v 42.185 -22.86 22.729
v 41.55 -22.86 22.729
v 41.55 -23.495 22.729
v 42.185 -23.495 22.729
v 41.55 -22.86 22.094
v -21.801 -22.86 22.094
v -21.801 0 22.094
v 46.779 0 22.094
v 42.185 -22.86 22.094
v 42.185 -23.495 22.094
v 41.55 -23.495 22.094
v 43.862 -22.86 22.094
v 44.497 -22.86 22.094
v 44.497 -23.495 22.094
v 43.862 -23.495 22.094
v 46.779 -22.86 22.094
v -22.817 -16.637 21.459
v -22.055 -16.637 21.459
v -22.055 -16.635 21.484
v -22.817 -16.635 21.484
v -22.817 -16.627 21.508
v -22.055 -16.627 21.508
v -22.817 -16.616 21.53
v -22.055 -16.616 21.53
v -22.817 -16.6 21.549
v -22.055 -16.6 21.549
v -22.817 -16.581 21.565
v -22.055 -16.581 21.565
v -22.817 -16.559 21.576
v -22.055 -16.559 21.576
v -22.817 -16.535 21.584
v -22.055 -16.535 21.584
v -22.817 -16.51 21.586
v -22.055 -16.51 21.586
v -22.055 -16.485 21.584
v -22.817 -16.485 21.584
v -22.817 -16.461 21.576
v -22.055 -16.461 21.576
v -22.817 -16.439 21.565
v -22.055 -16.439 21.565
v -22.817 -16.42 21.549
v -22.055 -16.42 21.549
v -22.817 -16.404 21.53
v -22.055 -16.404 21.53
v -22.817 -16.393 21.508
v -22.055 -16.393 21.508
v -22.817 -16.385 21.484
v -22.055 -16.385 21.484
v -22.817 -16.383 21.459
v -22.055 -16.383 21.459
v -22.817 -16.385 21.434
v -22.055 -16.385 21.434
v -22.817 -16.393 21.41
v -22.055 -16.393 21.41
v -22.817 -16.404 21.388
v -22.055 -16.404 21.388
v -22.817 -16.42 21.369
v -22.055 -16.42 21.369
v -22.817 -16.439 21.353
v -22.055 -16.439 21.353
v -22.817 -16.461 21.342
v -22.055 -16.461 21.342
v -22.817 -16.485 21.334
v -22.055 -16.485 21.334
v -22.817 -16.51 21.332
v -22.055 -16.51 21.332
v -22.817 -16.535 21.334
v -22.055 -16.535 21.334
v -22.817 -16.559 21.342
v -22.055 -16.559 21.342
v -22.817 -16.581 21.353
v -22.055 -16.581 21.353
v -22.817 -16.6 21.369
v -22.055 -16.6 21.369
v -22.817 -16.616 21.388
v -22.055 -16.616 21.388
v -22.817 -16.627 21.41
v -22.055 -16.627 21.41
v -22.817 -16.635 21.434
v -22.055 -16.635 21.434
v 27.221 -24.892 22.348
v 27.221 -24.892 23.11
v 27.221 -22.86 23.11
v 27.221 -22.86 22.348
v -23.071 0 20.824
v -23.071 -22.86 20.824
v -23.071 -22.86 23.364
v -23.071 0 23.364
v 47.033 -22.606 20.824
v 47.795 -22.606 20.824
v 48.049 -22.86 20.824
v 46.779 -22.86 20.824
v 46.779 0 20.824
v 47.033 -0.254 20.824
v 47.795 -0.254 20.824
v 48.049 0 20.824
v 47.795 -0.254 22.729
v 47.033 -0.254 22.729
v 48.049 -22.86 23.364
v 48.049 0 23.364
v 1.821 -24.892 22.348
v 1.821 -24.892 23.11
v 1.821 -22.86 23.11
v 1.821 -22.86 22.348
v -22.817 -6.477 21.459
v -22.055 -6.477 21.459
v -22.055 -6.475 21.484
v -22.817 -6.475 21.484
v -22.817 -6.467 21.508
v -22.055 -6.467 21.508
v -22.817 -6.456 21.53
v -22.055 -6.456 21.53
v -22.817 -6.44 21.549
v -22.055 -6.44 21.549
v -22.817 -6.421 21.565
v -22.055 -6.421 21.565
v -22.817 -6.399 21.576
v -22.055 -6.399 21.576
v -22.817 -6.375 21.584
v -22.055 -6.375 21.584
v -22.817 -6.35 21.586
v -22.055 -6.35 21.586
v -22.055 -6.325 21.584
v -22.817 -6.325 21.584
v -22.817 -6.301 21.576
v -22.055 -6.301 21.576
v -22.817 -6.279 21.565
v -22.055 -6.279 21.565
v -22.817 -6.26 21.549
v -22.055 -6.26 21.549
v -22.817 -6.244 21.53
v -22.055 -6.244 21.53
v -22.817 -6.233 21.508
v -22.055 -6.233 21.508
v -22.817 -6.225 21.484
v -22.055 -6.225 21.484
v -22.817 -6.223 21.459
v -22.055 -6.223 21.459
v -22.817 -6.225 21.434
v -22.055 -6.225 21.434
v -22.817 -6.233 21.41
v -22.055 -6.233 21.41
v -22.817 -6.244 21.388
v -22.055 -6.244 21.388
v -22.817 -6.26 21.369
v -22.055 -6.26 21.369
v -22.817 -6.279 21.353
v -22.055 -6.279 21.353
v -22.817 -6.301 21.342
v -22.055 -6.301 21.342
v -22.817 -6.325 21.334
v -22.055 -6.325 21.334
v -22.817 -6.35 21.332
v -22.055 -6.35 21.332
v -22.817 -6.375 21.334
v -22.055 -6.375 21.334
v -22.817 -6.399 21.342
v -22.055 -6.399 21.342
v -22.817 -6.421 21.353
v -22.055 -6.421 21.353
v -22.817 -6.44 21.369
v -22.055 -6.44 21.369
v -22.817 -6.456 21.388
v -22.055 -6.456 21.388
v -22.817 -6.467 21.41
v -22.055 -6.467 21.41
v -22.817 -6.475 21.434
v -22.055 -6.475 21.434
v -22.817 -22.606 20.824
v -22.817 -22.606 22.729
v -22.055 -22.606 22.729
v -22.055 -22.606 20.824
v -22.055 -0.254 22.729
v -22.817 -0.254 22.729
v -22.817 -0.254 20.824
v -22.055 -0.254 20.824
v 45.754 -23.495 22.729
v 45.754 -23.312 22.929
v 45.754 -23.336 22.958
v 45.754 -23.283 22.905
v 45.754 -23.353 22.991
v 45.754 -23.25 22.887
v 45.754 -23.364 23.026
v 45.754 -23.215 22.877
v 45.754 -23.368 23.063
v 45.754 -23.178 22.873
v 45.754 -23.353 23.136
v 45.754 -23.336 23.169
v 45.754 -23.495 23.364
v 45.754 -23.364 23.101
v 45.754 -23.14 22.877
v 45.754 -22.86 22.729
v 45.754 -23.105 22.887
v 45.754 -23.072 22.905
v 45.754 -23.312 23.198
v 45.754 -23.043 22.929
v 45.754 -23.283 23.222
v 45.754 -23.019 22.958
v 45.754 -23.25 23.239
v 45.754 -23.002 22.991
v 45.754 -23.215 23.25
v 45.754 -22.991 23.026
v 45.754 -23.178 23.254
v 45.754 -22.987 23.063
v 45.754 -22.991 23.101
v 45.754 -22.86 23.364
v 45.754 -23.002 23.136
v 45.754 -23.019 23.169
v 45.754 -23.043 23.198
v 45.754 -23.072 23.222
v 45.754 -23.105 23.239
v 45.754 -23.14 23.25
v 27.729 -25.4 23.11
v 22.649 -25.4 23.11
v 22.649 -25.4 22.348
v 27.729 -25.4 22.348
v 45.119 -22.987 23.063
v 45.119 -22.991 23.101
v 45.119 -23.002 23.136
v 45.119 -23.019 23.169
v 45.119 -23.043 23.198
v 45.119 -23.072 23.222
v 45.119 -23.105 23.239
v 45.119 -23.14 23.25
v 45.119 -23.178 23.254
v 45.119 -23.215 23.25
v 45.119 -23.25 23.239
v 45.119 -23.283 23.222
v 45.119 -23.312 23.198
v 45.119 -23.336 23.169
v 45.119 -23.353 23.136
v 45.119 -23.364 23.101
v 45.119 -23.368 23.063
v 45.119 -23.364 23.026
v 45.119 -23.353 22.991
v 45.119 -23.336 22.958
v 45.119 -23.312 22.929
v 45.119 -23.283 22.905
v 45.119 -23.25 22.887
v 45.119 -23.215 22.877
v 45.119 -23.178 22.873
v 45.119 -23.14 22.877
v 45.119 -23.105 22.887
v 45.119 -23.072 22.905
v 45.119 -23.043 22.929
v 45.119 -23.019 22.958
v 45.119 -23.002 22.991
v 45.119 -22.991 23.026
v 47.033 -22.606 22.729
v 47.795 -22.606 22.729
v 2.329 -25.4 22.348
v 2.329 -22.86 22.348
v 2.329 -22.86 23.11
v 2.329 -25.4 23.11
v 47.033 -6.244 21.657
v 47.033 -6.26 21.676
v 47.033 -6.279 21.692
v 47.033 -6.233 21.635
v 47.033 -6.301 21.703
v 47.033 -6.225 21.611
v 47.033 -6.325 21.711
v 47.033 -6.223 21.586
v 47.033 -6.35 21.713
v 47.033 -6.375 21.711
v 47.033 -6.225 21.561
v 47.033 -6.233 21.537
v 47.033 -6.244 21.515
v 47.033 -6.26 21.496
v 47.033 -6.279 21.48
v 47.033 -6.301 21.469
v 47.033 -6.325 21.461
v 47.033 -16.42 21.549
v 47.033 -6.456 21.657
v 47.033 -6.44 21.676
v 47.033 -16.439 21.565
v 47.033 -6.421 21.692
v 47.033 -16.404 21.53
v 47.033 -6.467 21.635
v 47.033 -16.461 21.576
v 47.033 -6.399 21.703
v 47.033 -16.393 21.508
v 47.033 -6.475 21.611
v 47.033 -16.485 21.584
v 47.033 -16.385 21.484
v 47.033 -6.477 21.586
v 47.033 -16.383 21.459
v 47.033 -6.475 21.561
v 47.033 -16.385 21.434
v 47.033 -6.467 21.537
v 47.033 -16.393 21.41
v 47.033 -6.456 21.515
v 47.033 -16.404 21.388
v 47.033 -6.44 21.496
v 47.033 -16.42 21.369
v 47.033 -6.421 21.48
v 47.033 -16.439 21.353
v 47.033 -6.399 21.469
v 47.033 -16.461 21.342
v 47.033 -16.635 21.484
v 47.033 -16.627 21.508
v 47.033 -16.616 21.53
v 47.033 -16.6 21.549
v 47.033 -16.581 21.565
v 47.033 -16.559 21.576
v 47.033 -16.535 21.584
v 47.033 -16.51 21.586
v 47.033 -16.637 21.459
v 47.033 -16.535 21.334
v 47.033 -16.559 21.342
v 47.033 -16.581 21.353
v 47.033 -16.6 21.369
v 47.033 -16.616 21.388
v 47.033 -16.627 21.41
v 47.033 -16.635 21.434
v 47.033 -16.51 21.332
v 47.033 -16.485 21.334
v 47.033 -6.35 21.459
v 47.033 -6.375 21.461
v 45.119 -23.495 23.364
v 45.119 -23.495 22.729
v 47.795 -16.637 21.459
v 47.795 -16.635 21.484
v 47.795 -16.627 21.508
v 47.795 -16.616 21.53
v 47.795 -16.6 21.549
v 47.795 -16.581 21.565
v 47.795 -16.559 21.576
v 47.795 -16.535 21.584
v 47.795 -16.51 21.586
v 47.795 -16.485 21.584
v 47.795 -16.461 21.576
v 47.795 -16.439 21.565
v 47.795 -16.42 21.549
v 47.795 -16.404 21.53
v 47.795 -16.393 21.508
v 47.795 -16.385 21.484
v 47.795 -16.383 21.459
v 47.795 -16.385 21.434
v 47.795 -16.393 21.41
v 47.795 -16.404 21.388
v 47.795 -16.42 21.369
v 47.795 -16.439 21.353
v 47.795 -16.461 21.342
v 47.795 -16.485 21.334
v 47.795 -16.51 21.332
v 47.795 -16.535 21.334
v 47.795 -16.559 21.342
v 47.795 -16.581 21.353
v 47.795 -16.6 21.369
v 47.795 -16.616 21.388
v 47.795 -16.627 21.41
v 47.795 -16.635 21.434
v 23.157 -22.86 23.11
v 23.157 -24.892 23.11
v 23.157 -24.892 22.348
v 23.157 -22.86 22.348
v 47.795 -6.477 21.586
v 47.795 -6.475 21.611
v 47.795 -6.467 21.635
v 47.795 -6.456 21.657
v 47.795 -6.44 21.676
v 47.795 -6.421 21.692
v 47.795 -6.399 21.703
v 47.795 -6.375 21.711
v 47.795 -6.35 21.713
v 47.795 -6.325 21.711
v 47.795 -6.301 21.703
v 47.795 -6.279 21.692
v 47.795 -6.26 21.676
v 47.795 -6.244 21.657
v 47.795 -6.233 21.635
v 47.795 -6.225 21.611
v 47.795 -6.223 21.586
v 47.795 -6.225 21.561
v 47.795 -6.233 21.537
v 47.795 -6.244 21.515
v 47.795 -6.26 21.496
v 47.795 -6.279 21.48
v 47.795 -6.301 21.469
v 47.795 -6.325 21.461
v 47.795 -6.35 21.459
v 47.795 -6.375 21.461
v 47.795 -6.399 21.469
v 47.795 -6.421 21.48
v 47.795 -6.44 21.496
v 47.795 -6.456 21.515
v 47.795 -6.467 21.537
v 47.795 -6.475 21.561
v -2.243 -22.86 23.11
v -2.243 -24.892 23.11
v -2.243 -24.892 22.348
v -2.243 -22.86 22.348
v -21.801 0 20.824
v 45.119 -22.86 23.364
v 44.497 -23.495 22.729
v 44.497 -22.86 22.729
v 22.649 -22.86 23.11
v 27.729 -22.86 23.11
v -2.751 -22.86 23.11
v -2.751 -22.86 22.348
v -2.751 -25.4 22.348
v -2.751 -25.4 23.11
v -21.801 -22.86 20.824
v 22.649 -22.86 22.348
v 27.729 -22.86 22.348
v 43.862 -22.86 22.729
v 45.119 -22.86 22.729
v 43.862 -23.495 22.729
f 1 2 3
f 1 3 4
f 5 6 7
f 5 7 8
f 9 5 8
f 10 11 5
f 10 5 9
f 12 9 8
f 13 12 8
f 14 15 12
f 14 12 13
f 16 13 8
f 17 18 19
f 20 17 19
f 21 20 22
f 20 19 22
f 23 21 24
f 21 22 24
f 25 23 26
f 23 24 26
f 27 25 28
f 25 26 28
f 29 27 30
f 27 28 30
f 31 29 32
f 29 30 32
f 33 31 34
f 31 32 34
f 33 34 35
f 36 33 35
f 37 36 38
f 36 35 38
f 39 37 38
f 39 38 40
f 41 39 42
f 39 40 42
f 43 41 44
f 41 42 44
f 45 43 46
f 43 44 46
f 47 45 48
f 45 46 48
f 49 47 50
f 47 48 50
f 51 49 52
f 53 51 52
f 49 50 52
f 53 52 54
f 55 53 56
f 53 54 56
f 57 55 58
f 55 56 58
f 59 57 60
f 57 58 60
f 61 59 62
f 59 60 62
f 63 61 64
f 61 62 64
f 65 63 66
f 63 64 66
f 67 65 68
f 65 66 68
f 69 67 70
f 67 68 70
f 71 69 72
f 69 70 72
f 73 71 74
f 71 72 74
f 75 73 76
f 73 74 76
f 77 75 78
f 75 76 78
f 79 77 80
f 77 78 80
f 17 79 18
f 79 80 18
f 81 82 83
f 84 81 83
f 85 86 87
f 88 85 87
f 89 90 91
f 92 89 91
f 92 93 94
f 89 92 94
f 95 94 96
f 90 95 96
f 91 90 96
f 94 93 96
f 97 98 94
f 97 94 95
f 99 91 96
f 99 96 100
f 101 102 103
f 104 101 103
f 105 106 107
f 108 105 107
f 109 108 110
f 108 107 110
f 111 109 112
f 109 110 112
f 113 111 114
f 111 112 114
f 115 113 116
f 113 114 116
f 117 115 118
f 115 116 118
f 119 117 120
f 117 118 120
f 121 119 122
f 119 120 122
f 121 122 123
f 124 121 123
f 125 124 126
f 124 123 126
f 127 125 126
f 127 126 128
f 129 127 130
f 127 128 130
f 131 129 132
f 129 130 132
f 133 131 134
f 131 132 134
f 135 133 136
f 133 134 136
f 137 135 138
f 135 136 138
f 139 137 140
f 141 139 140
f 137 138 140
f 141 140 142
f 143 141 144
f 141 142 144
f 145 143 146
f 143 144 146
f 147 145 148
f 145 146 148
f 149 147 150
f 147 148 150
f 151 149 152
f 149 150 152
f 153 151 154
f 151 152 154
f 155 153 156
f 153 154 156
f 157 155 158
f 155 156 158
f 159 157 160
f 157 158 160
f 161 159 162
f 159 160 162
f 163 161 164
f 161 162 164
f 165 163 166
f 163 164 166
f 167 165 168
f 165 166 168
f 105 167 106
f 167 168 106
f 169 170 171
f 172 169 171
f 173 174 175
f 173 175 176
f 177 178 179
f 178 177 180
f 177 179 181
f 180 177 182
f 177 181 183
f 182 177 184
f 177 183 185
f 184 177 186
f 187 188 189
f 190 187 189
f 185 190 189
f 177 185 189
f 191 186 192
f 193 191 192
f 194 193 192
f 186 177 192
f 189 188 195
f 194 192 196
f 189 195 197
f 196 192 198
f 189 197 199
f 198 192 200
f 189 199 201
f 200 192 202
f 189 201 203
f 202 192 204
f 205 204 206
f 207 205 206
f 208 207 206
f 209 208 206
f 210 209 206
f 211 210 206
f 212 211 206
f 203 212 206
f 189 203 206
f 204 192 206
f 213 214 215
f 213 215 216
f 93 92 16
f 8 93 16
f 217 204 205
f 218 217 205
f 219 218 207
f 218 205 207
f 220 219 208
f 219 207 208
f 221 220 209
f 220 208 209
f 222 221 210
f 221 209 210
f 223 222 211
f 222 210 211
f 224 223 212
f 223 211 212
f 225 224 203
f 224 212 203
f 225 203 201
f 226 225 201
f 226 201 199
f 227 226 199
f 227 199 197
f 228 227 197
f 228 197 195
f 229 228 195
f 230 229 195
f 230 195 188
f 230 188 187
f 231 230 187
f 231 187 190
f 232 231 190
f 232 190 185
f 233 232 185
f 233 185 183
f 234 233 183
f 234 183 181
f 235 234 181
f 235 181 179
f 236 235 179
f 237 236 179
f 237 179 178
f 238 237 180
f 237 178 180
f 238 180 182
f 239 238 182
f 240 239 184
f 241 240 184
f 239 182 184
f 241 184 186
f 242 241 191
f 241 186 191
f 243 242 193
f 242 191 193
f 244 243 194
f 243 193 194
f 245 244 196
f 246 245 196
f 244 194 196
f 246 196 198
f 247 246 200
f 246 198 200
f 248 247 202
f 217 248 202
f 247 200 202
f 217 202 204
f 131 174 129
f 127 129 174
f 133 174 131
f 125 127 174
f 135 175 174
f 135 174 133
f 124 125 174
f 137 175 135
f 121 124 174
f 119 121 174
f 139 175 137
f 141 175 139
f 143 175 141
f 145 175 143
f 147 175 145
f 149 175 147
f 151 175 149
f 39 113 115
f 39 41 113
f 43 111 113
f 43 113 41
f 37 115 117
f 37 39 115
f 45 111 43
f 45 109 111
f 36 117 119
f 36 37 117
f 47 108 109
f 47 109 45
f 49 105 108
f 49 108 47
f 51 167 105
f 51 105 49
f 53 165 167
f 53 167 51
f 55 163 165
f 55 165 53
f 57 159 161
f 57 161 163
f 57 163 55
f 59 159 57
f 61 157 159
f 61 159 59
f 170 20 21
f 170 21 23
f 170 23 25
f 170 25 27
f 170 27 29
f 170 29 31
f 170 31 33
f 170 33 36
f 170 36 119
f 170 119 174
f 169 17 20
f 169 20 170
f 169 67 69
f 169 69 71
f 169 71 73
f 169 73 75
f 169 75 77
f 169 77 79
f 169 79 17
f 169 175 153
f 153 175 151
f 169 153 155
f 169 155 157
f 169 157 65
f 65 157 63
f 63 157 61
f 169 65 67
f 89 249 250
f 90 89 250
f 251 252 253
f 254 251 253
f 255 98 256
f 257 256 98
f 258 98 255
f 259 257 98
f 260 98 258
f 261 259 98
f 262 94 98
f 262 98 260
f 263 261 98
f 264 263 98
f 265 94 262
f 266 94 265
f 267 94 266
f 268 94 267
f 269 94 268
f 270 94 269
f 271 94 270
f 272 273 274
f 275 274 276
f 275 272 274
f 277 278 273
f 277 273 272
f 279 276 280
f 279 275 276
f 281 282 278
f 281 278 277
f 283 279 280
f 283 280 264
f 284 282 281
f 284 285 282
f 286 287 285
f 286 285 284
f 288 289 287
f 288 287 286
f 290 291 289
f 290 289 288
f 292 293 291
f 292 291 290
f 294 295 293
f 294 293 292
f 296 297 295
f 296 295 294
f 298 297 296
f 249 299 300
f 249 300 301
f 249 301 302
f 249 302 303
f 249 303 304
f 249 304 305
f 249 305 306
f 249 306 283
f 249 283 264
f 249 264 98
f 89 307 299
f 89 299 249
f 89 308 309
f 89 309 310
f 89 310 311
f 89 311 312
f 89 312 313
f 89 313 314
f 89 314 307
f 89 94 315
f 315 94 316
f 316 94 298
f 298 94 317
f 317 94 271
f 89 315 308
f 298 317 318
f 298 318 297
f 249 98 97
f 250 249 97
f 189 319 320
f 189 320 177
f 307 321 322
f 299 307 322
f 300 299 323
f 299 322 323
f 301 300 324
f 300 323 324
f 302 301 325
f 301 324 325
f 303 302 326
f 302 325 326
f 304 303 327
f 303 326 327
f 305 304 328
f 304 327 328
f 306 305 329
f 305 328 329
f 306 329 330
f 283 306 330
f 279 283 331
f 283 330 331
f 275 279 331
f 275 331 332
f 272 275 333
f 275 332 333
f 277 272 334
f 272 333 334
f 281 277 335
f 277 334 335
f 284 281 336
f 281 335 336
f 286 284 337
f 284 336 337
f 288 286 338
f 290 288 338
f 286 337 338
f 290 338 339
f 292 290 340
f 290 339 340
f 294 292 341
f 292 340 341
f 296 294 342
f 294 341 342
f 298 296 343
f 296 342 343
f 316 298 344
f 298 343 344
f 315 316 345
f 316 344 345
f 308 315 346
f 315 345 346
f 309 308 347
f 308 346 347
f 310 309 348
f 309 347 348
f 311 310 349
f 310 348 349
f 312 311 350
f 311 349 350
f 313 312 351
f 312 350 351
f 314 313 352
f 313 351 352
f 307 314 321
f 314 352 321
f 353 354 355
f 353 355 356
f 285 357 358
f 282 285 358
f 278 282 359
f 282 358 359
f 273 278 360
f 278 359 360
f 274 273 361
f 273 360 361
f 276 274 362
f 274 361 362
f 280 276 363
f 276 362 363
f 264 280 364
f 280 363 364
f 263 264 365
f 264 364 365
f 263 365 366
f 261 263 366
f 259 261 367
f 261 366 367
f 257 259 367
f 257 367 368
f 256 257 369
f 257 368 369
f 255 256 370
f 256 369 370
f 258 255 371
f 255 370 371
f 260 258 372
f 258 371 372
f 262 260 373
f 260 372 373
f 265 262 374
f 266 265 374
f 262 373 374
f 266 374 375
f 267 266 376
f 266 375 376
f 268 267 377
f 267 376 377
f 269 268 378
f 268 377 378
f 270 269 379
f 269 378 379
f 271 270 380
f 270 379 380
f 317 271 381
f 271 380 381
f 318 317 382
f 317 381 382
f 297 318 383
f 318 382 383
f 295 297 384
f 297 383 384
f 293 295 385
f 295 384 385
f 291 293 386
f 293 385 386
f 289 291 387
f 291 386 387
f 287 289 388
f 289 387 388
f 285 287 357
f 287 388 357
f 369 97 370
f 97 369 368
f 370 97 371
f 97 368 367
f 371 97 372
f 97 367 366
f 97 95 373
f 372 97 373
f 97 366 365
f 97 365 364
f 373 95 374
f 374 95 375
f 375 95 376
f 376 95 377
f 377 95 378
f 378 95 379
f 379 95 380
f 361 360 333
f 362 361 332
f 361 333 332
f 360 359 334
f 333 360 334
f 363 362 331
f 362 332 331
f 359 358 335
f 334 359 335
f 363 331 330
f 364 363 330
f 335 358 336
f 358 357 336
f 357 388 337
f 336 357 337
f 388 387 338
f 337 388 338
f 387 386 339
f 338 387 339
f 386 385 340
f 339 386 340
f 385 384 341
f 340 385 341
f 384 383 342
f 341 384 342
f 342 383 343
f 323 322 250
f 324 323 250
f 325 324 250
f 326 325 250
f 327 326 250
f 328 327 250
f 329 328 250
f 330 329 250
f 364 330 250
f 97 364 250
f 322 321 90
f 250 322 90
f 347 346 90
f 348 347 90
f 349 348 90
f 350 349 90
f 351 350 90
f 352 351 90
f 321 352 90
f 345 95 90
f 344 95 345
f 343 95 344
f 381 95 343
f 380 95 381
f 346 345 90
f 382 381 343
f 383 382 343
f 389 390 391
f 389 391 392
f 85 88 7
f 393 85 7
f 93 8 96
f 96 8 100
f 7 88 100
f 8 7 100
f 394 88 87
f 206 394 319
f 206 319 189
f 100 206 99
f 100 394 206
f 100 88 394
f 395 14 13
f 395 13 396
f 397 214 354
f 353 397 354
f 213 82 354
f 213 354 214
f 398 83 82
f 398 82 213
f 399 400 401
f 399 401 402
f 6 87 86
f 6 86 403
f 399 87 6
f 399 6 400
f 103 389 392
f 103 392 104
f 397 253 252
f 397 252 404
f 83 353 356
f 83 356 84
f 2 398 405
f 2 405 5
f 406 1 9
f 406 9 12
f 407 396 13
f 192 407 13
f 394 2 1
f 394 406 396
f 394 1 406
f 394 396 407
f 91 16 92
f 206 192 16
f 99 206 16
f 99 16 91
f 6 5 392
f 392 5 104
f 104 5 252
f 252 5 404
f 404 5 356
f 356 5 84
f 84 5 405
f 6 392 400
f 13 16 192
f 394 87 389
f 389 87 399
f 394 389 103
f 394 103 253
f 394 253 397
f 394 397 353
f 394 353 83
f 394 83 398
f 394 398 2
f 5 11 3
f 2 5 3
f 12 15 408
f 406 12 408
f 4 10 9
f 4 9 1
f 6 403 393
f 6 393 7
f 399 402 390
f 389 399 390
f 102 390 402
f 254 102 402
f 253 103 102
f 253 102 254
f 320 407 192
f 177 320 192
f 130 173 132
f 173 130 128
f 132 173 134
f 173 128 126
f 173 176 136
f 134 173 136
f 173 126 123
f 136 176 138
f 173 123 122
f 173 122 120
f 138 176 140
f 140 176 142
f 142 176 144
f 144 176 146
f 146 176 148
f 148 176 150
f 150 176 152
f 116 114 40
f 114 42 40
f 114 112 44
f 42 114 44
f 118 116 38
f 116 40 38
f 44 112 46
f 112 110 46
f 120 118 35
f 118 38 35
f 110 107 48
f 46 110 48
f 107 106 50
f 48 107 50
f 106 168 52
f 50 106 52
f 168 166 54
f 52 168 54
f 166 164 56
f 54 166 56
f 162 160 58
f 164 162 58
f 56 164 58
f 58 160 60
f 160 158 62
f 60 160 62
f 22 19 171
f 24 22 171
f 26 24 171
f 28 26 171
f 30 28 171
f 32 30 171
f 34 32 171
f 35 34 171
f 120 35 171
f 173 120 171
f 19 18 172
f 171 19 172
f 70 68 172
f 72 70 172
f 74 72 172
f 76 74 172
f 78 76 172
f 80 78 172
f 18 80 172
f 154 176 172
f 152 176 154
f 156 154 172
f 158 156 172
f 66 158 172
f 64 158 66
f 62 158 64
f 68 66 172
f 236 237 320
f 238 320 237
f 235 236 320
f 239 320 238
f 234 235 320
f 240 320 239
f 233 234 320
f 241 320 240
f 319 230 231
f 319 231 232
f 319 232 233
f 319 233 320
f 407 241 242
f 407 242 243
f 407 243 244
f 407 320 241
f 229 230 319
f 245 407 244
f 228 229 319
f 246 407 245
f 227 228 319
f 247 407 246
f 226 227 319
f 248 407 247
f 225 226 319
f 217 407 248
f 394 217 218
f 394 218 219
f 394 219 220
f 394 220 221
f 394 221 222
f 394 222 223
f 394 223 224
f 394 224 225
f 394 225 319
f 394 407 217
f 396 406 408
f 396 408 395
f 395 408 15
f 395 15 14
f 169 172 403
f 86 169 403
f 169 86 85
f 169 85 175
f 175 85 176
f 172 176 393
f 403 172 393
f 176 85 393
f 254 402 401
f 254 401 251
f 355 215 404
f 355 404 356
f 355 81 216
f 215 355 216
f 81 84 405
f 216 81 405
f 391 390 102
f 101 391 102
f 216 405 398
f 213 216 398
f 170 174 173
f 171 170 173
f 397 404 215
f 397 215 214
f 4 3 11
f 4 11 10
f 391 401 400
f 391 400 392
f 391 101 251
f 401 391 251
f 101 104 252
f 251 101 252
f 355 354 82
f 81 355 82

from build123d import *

# Parameters (mm, degrees)
F0_W      = 71.12
F0_H      = 2.54
F1_DEPTH  = 22.86
F2_W      = 68.58
F2_H      = 1.27
F3_DEPTH  = 22.86
F4_W      = 0.762
F4_H      = 22.352
F5_DEPTH  = 1.905
F6_W      = 0.762
F6_H      = 22.352
F7_DEPTH  = 1.905
F8_R      = 0.127
F9_DEPTH  = 0.762
F10_R     = 0.127
F11_DEPTH = 0.762
F12_W     = 5.08
F12_H     = 0.762
F13_DEPTH = 2.54
F14_W     = 4.064
F14_H     = 2.032
F15_DEPTH = 2.287
F16_W     = 4.064
F16_H     = 2.032
F17_DEPTH = 2.287
F18_W     = 0.635
F18_H     = 0.635
F19_DEPTH = 0.635
F20_R     = 0.1905
F21_DEPTH = 2.54


with BuildPart() as f1:
    # F0 (on Front) → F1 (new body)
    with BuildSketch(Plane.XZ):
        with Locations((12.489298, 22.094047)):
            Rectangle(F0_W, F0_H)
    extrude(amount=F1_DEPTH)

    # F2 (on face) → F3 (cut)
    with BuildSketch(Plane.XZ.offset(22.86)):
        with Locations((12.489298, 21.459047)):
            Rectangle(F2_W, F2_H)
    extrude(amount=-F3_DEPTH, mode=Mode.SUBTRACT)

    # F4 (on face) → F5 (cut)
    with BuildSketch(Plane(origin=(0, 0, 20.824047), x_dir=(1, 0, 0), z_dir=(0, 0, -1))):
        with Locations((47.414298, 11.43)):
            Rectangle(F4_W, F4_H)
    extrude(amount=-F5_DEPTH, mode=Mode.SUBTRACT)

    # F6 (on face) → F7 (cut)
    with BuildSketch(Plane(origin=(0, 0, 20.824047), x_dir=(1, 0, 0), z_dir=(0, 0, -1))):
        with Locations((-22.435702, 11.43)):
            Rectangle(F6_W, F6_H)
    extrude(amount=-F7_DEPTH, mode=Mode.SUBTRACT)

    # F8 (on face) → F9 (join, through all)
    with BuildSketch(Plane(origin=(47.795298, 0, 0), x_dir=(0, -1, 0), z_dir=(-1, 0, 0))):
        with Locations((16.51, 21.459047)):
            Circle(F8_R)
        with Locations((6.35, 21.586047)):
            Circle(F8_R)
    extrude(amount=F9_DEPTH)

    # F10 (on face) → F11 (join, through all)
    with BuildSketch(Plane(origin=(-22.054702, 0, 0), x_dir=(0, -1, 0), z_dir=(-1, 0, 0))):
        with Locations((16.51, 21.459047)):
            Circle(F10_R)
        with Locations((6.35, 21.459047)):
            Circle(F10_R)
    extrude(amount=F11_DEPTH)

    # F12 (on face) → F13 (join)
    with BuildSketch(Plane.XZ.offset(22.86)):
        with Locations((-0.210702, 22.729047)):
            Rectangle(F12_W, F12_H)
        with Locations((25.189298, 22.729047)):
            Rectangle(F12_W, F12_H)
    extrude(amount=F13_DEPTH)

    # F14 (on face) → F15 (cut, through all)
    with BuildSketch(Plane.XY.offset(23.110047)):
        with Locations((25.189298, -23.876)):
            Rectangle(F14_W, F14_H)
    extrude(amount=-F15_DEPTH, mode=Mode.SUBTRACT)

    # F16 (on face) → F17 (cut, through all)
    with BuildSketch(Plane.XY.offset(23.110047)):
        with Locations((-0.210702, -23.876)):
            Rectangle(F16_W, F16_H)
    extrude(amount=-F17_DEPTH, mode=Mode.SUBTRACT)

    # F18 (on face) → F19 (join)
    with BuildSketch(Plane.XZ.offset(22.86)):
        with Locations((45.436141, 23.046547)):
            Rectangle(F18_W, F18_H)
        with Locations((44.179277, 22.411547)):
            Rectangle(F18_W, F18_H)
        with Locations((41.867119, 22.411547)):
            Rectangle(F18_W, F18_H)
    extrude(amount=F19_DEPTH)

    # F20 (on face) → F21 (cut)
    with BuildSketch(Plane.YZ.offset(45.753641)):
        with Locations((-23.1775, 23.063494)):
            Circle(F20_R)
    extrude(amount=-F21_DEPTH, mode=Mode.SUBTRACT)


solid = f1.part
